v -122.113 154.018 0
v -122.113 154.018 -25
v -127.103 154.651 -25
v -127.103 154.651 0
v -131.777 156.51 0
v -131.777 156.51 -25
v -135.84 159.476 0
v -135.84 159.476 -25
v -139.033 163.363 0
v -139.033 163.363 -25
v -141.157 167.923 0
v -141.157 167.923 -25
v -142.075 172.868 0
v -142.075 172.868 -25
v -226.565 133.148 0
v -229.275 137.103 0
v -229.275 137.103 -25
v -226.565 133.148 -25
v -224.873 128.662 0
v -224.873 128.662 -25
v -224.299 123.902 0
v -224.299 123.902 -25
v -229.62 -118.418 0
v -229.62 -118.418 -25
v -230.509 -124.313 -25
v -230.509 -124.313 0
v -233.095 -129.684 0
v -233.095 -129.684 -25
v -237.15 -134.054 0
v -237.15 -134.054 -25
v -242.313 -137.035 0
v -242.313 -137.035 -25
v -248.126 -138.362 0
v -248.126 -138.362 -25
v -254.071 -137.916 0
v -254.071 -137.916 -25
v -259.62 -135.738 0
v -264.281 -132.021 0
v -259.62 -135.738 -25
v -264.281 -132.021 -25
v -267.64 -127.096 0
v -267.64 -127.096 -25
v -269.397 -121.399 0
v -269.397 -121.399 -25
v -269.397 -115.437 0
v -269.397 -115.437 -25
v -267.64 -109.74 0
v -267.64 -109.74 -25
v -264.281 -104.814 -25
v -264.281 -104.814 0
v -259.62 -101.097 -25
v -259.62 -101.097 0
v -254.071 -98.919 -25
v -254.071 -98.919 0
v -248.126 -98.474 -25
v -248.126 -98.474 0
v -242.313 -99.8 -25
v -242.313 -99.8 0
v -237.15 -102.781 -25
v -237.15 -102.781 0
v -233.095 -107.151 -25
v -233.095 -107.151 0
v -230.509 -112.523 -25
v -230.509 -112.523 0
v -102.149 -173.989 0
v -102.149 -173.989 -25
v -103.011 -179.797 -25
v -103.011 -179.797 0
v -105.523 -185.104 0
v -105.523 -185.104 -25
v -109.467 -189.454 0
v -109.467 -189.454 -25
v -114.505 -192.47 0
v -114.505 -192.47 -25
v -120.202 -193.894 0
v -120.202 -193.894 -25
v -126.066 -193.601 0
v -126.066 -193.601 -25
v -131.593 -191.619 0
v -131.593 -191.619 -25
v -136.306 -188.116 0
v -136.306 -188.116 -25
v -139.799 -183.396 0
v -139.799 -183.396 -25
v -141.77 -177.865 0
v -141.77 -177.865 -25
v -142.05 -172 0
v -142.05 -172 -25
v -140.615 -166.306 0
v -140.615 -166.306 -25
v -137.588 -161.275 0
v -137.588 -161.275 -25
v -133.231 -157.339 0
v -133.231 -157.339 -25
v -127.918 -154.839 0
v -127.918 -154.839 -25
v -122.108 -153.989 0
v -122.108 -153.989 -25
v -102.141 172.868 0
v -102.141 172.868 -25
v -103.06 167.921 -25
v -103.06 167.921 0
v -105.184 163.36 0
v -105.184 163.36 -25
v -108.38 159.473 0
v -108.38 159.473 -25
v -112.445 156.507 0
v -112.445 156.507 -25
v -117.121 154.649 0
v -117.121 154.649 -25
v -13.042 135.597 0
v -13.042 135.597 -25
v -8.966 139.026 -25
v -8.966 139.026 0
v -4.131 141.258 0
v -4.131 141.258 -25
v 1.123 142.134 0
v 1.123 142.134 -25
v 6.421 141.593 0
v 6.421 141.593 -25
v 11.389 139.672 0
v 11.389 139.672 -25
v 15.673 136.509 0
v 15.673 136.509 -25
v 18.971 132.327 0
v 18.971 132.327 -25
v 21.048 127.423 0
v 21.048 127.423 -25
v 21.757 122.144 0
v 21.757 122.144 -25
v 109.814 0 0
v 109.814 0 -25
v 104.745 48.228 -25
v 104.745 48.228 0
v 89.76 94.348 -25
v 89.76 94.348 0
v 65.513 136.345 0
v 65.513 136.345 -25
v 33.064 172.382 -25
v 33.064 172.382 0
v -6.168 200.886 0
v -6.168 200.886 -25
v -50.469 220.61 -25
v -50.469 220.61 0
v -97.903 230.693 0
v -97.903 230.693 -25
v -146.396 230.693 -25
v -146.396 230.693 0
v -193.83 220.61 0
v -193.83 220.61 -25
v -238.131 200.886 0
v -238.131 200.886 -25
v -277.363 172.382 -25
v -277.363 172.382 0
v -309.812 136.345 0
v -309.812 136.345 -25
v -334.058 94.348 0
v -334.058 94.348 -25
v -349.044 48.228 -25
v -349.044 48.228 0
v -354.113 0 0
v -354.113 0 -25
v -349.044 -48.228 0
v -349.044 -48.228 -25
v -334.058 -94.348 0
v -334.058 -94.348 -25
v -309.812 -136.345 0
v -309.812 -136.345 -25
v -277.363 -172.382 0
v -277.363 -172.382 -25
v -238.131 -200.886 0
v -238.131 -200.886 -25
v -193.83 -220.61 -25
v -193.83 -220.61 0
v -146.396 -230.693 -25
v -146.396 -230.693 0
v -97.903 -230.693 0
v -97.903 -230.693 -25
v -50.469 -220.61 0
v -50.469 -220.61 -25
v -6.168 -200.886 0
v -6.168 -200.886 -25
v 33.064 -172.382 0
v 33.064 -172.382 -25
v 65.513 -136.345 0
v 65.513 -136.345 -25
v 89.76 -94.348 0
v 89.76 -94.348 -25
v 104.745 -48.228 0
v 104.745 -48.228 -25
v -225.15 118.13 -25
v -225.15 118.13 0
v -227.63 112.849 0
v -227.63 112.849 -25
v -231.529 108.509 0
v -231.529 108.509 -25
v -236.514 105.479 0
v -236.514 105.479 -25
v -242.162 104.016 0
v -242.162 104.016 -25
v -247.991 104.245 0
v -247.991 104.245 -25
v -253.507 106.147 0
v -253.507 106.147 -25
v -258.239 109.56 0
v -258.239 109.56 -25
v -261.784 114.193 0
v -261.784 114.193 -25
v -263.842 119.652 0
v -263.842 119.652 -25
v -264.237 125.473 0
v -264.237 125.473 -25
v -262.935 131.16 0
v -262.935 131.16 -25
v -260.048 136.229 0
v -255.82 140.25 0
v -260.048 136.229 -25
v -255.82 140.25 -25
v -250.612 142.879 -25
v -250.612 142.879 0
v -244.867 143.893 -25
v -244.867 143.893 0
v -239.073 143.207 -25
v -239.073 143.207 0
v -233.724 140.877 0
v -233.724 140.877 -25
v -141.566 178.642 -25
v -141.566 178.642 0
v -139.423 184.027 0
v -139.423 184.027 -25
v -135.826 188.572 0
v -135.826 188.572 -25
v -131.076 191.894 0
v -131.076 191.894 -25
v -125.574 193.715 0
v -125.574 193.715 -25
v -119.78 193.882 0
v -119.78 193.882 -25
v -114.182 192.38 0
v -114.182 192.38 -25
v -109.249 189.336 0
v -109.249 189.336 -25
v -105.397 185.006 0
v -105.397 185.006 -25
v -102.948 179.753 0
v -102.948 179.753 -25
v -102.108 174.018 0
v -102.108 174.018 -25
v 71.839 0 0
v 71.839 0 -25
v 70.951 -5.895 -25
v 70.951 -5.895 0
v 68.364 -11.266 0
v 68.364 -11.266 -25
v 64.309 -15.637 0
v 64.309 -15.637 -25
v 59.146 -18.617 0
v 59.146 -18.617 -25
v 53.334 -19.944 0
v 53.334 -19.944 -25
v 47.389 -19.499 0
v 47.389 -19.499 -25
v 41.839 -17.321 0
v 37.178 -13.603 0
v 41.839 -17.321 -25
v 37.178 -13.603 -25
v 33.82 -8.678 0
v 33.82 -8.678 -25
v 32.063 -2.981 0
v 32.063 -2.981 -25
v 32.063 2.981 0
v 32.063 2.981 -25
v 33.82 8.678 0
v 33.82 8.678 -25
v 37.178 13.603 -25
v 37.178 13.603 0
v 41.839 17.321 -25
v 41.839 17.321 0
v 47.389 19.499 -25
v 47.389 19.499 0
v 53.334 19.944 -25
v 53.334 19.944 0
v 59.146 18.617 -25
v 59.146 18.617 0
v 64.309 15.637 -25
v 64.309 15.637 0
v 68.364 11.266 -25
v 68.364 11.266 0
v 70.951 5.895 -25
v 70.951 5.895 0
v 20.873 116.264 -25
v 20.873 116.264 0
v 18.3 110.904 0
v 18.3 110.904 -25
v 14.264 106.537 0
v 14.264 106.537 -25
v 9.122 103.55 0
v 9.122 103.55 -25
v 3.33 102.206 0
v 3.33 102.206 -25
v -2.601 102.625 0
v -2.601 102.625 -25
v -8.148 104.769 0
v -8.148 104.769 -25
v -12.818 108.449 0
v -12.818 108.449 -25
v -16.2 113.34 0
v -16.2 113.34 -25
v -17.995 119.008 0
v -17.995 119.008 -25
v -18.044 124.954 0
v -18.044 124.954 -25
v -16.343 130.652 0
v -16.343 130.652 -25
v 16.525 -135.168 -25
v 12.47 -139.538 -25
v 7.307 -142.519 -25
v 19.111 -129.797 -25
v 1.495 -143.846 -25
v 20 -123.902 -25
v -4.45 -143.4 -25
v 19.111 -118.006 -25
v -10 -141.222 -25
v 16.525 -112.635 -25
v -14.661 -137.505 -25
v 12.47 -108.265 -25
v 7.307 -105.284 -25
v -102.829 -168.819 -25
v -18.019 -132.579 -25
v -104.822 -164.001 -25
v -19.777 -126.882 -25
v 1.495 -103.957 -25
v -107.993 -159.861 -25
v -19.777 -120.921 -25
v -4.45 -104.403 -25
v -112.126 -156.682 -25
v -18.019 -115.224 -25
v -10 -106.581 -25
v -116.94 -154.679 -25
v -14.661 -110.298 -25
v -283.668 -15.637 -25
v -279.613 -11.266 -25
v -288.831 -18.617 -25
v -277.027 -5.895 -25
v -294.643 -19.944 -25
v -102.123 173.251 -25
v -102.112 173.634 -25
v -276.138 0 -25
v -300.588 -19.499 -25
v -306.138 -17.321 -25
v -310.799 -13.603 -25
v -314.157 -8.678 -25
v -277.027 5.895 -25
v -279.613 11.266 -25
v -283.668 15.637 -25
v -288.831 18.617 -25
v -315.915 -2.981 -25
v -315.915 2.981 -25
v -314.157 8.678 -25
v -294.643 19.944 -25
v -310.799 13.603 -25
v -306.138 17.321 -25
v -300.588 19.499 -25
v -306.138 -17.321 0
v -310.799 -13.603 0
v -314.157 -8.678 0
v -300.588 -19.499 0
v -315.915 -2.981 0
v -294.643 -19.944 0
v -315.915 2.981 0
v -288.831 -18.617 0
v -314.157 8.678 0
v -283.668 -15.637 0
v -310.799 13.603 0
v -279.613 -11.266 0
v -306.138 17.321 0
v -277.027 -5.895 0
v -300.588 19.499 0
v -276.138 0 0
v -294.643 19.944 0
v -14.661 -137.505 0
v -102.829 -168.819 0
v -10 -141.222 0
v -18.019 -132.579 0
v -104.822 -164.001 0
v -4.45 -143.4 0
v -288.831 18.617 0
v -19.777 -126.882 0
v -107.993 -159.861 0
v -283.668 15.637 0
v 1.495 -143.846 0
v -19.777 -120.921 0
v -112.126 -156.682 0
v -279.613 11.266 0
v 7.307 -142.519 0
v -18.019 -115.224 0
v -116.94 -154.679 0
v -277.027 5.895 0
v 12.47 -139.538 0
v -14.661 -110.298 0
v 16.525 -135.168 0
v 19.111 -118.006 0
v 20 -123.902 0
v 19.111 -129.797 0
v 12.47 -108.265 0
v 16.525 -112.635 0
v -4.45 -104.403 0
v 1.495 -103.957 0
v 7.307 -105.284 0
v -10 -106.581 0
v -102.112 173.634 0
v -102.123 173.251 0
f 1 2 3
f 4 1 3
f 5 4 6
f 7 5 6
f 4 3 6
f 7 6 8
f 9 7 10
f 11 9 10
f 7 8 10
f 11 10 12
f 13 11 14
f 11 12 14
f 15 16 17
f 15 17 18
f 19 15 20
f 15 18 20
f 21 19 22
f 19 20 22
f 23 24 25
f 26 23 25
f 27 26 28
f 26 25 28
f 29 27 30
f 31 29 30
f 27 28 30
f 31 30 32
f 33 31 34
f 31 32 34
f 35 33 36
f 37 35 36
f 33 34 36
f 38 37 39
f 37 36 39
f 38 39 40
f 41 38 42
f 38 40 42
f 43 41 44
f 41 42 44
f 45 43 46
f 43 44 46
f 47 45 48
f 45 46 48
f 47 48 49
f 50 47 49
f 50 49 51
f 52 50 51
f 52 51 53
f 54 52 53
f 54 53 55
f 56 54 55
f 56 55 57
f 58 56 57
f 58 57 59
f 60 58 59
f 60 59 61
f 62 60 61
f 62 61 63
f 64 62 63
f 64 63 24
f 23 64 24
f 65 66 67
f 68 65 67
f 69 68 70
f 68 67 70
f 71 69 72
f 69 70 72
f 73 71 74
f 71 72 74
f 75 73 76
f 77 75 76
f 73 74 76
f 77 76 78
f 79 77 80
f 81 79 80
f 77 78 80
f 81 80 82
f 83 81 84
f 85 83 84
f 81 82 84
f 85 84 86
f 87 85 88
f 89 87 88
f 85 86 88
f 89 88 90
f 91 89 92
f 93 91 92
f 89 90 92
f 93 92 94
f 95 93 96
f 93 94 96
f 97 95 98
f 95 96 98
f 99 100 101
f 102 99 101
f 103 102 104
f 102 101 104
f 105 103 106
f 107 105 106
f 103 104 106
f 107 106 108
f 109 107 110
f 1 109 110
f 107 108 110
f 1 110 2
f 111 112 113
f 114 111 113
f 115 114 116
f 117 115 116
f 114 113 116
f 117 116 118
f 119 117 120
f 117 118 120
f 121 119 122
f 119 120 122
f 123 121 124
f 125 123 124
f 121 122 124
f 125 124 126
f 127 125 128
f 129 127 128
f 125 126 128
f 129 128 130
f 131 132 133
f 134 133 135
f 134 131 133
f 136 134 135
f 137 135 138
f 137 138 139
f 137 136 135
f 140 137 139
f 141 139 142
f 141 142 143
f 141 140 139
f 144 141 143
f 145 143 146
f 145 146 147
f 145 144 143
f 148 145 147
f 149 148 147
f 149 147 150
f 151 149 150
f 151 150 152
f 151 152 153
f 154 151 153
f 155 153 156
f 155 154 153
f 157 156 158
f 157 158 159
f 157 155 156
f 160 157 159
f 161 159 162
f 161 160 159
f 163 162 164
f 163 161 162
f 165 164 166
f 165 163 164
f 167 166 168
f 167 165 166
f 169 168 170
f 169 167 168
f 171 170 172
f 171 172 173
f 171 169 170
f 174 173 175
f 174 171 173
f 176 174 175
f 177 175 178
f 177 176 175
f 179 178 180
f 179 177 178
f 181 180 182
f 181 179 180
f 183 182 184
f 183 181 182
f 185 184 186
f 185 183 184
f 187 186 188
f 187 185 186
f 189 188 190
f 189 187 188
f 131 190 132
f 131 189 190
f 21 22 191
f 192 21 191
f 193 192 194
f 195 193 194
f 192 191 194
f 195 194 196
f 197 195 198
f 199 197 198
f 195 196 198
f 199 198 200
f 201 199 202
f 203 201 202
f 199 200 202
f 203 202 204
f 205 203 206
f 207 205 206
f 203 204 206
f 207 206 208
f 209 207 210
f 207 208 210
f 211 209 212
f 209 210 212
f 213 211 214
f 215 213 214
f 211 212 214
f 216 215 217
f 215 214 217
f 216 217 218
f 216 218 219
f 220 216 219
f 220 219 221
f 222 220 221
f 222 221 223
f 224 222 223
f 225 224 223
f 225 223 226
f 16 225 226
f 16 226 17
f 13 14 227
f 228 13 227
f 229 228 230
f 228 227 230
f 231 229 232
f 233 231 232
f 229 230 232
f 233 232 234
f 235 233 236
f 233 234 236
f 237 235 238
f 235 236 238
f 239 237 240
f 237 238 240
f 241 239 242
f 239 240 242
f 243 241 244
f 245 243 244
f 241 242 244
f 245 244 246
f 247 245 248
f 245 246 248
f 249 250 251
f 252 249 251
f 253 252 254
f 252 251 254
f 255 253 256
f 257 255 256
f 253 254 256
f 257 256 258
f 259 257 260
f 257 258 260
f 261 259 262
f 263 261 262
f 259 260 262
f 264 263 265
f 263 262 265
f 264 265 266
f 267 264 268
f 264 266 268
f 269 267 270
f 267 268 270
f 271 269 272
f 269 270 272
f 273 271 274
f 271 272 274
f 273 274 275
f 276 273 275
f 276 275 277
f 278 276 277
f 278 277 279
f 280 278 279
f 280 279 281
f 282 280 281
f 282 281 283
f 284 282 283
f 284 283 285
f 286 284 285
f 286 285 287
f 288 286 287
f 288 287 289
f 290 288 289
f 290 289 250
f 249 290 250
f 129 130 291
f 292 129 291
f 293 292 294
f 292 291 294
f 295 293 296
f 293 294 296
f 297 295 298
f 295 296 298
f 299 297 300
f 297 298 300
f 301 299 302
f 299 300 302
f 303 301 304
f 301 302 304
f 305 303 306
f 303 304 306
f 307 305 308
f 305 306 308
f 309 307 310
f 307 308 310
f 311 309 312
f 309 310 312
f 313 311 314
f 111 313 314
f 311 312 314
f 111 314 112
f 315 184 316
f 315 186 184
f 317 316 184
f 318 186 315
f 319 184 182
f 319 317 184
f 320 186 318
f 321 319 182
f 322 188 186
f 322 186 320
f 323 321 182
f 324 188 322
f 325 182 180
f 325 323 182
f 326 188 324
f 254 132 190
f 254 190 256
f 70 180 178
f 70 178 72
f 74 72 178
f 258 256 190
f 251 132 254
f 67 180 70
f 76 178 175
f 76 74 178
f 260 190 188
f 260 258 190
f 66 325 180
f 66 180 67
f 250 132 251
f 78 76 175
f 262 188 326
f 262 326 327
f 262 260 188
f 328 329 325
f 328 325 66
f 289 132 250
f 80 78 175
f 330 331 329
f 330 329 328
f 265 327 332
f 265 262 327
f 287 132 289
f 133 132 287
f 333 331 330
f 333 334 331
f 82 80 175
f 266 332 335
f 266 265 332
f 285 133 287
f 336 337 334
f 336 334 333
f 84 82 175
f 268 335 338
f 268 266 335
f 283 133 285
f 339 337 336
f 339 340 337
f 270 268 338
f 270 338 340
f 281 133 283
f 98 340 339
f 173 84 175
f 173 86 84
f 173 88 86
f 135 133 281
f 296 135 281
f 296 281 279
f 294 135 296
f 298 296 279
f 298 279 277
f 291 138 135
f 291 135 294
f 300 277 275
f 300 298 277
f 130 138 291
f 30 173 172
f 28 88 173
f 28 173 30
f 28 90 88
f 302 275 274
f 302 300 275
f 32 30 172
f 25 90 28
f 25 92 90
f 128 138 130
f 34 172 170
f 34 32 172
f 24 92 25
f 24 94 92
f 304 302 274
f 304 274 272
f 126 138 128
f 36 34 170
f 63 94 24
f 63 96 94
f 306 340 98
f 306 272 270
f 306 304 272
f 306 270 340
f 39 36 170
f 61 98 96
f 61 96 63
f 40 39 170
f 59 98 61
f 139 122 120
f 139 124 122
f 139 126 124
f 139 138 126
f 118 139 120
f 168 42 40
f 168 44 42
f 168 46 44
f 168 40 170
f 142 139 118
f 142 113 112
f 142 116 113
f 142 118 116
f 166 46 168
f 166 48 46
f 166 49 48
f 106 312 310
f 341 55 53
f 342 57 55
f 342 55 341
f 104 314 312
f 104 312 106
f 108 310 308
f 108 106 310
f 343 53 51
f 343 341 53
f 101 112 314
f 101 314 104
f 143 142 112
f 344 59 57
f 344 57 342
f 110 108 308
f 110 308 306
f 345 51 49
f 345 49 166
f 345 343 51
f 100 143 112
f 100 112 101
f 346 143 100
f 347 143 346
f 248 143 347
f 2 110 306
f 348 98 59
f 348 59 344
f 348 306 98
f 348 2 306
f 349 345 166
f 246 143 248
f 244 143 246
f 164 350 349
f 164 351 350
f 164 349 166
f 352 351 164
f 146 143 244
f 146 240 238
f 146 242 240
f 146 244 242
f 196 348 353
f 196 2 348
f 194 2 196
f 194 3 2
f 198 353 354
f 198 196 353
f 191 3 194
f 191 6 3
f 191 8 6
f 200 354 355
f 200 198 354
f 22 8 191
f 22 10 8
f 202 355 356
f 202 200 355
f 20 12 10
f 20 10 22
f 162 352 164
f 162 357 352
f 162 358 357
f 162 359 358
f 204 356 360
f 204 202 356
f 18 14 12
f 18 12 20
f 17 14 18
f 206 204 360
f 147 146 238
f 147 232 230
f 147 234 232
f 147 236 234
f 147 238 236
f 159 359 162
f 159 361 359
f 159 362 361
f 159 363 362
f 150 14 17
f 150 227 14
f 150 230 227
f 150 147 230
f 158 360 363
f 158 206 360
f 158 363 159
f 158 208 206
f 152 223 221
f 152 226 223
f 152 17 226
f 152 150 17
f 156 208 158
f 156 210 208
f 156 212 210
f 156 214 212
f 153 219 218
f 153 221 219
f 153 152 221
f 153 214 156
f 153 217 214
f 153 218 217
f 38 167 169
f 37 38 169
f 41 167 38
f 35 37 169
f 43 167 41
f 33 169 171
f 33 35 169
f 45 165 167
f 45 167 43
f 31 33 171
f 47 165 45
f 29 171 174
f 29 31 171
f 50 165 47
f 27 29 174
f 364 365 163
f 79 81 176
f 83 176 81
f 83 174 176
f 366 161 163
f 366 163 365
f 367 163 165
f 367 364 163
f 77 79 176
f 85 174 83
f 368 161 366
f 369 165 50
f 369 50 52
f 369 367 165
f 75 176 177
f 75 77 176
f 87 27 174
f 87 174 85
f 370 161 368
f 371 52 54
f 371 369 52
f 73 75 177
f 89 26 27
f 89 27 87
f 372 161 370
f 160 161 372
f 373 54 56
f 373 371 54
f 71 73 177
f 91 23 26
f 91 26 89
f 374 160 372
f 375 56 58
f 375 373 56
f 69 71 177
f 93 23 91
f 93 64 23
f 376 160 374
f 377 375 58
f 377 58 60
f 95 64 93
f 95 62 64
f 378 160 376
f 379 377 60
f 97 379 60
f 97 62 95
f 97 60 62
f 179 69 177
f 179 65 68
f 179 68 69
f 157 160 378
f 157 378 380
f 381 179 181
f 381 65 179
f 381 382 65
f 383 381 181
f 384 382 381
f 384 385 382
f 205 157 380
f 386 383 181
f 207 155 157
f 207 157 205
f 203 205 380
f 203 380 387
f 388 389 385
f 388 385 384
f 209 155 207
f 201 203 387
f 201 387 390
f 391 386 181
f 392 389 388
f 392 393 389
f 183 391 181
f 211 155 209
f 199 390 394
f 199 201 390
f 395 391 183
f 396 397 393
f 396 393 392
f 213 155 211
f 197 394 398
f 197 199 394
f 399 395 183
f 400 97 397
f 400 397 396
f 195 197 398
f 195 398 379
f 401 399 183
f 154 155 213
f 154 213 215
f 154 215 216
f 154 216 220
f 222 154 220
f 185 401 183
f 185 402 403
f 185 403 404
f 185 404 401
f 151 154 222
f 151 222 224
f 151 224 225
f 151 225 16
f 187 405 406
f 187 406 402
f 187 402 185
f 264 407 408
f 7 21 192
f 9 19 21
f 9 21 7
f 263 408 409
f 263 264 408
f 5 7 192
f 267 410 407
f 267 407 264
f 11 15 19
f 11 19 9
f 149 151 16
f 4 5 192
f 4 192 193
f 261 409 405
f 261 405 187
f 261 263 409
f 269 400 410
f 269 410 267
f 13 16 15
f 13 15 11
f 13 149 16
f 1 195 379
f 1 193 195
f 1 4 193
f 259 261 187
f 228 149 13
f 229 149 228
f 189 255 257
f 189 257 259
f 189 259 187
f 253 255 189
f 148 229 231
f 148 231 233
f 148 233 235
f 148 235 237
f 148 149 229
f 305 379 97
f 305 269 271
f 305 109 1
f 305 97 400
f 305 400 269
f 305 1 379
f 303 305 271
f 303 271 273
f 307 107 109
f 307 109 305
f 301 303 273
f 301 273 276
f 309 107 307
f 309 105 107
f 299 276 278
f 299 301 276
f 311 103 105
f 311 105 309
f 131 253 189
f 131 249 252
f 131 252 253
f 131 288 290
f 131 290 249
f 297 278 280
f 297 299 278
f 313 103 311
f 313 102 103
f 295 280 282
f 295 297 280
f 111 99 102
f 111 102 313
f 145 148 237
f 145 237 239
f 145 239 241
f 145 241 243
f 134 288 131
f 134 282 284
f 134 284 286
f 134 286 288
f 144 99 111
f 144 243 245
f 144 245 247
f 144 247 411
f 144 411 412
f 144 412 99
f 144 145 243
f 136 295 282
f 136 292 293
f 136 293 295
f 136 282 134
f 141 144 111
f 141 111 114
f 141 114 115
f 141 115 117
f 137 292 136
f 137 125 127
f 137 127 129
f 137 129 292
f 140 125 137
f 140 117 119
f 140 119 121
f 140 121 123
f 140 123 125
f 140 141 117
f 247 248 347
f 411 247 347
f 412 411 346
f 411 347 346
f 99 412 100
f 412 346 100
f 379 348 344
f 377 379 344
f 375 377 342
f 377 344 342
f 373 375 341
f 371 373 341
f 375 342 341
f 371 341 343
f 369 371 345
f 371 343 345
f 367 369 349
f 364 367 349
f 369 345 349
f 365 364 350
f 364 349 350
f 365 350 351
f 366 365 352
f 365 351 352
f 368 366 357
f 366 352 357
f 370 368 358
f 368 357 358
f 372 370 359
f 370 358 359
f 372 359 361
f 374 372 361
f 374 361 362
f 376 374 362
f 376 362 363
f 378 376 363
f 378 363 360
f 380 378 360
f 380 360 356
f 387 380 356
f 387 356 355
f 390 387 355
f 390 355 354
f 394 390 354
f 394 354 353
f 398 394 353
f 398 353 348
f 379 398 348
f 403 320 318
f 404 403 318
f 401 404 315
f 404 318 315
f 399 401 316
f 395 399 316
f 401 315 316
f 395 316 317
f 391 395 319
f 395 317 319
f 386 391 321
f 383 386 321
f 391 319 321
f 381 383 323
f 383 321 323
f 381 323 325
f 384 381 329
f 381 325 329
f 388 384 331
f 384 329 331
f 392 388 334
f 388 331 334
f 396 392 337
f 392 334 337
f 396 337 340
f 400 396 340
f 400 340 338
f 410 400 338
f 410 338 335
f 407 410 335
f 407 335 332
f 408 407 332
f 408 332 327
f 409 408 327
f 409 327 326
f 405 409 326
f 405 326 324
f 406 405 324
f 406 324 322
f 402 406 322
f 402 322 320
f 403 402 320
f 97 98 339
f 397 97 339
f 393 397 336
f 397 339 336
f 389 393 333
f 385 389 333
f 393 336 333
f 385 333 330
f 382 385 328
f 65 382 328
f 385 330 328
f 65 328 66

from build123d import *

# Parameters (mm, degrees)
F2_R     = 20
F3_DEPTH = 507.706612
F4_DEPTH = 346.473515


with BuildPart() as f1:
    # F0 (on Front) → F1 (revolve)
    with BuildSketch(Plane.XZ):
        Polygon((-122.14937, -25), (-26.473614, -25), (109.813852, -25), (109.813852, 0), (0, 0), (-26.473614, 0), (-122.14937, 0), align=None)
    revolve(axis=Axis((-122.14937, 0, 176.894253), (0, 0, 1)))

    # F2 (on face) → F3 (cut)
    with BuildSketch(Plane(origin=(0, 0, -25), x_dir=(1, 0, 0), z_dir=(0, 0, -1))):
        with Locations((-296.138028, 0)):
            Circle(F2_R)
    extrude(amount=-F3_DEPTH, mode=Mode.SUBTRACT)

    # F2 (on face) → F4 (cut)
    with BuildSketch(Plane(origin=(0, 0, -25), x_dir=(1, 0, 0), z_dir=(0, 0, -1))):
        with Locations((-249.620262, 118.417841)):
            Circle(F2_R)
        with Locations((-296.138028, 0)):
            Circle(F2_R)
        with BuildLine():
            ThreePointArc((-229.275148, -137.103469), (-225.584149, -130.955878), (-224.298739, -123.901511))
            ThreePointArc((-224.298739, -123.901511), (-263.01333, -116.847144), (-229.275148, -137.103469))
        make_face()
        with BuildLine():
            ThreePointArc((-102.14937, 173.988658), (-136.306099, 188.116185), (-122.108072, 153.9887))
            ThreePointArc((-122.108072, 153.9887), (-107.992641, 159.861131), (-102.14937, 173.988658))
        make_face()
        with BuildLine():
            ThreePointArc((21.757231, -122.144211), (-5.454588, -103.48973), (-13.041736, -135.597485))
            ThreePointArc((-13.041736, -135.597485), (8.96905, -140.798692), (21.757231, -122.144211))
        make_face()
        with BuildLine():
            ThreePointArc((-122.112818, -154.017654), (-135.839579, -159.476481), (-142.075022, -172.868345))
            ThreePointArc((-142.075022, -172.868345), (-132.108072, -173.730088), (-122.108072, -174.017653))
            Line((-122.108072, -174.017653), (-122.112818, -154.017654))
        make_face()
        with BuildLine():
            ThreePointArc((-122.108072, -174.017653), (-132.108072, -173.730088), (-142.075022, -172.868345))
            ThreePointArc((-142.075022, -172.868345), (-122.682964, -194.009389), (-102.108072, -174.017653))
            ThreePointArc((-102.108072, -174.017653), (-102.116336, -173.442761), (-102.141122, -172.868345))
            ThreePointArc((-102.141122, -172.868345), (-112.108072, -173.730088), (-122.108072, -174.017653))
        make_face()
        with BuildLine():
            ThreePointArc((-102.141122, -172.868345), (-108.380016, -159.473222), (-122.112818, -154.017654))
            Line((-122.112818, -154.017654), (-122.108072, -174.017653))
            ThreePointArc((-122.108072, -174.017653), (-112.108072, -173.730088), (-102.141122, -172.868345))
        make_face()
        with Locations((51.839288, 0)):
            Circle(F2_R)
        with Locations((0, 123.901511)):
            Circle(F2_R)
    extrude(amount=-F4_DEPTH, mode=Mode.SUBTRACT)


solid = f1.part
